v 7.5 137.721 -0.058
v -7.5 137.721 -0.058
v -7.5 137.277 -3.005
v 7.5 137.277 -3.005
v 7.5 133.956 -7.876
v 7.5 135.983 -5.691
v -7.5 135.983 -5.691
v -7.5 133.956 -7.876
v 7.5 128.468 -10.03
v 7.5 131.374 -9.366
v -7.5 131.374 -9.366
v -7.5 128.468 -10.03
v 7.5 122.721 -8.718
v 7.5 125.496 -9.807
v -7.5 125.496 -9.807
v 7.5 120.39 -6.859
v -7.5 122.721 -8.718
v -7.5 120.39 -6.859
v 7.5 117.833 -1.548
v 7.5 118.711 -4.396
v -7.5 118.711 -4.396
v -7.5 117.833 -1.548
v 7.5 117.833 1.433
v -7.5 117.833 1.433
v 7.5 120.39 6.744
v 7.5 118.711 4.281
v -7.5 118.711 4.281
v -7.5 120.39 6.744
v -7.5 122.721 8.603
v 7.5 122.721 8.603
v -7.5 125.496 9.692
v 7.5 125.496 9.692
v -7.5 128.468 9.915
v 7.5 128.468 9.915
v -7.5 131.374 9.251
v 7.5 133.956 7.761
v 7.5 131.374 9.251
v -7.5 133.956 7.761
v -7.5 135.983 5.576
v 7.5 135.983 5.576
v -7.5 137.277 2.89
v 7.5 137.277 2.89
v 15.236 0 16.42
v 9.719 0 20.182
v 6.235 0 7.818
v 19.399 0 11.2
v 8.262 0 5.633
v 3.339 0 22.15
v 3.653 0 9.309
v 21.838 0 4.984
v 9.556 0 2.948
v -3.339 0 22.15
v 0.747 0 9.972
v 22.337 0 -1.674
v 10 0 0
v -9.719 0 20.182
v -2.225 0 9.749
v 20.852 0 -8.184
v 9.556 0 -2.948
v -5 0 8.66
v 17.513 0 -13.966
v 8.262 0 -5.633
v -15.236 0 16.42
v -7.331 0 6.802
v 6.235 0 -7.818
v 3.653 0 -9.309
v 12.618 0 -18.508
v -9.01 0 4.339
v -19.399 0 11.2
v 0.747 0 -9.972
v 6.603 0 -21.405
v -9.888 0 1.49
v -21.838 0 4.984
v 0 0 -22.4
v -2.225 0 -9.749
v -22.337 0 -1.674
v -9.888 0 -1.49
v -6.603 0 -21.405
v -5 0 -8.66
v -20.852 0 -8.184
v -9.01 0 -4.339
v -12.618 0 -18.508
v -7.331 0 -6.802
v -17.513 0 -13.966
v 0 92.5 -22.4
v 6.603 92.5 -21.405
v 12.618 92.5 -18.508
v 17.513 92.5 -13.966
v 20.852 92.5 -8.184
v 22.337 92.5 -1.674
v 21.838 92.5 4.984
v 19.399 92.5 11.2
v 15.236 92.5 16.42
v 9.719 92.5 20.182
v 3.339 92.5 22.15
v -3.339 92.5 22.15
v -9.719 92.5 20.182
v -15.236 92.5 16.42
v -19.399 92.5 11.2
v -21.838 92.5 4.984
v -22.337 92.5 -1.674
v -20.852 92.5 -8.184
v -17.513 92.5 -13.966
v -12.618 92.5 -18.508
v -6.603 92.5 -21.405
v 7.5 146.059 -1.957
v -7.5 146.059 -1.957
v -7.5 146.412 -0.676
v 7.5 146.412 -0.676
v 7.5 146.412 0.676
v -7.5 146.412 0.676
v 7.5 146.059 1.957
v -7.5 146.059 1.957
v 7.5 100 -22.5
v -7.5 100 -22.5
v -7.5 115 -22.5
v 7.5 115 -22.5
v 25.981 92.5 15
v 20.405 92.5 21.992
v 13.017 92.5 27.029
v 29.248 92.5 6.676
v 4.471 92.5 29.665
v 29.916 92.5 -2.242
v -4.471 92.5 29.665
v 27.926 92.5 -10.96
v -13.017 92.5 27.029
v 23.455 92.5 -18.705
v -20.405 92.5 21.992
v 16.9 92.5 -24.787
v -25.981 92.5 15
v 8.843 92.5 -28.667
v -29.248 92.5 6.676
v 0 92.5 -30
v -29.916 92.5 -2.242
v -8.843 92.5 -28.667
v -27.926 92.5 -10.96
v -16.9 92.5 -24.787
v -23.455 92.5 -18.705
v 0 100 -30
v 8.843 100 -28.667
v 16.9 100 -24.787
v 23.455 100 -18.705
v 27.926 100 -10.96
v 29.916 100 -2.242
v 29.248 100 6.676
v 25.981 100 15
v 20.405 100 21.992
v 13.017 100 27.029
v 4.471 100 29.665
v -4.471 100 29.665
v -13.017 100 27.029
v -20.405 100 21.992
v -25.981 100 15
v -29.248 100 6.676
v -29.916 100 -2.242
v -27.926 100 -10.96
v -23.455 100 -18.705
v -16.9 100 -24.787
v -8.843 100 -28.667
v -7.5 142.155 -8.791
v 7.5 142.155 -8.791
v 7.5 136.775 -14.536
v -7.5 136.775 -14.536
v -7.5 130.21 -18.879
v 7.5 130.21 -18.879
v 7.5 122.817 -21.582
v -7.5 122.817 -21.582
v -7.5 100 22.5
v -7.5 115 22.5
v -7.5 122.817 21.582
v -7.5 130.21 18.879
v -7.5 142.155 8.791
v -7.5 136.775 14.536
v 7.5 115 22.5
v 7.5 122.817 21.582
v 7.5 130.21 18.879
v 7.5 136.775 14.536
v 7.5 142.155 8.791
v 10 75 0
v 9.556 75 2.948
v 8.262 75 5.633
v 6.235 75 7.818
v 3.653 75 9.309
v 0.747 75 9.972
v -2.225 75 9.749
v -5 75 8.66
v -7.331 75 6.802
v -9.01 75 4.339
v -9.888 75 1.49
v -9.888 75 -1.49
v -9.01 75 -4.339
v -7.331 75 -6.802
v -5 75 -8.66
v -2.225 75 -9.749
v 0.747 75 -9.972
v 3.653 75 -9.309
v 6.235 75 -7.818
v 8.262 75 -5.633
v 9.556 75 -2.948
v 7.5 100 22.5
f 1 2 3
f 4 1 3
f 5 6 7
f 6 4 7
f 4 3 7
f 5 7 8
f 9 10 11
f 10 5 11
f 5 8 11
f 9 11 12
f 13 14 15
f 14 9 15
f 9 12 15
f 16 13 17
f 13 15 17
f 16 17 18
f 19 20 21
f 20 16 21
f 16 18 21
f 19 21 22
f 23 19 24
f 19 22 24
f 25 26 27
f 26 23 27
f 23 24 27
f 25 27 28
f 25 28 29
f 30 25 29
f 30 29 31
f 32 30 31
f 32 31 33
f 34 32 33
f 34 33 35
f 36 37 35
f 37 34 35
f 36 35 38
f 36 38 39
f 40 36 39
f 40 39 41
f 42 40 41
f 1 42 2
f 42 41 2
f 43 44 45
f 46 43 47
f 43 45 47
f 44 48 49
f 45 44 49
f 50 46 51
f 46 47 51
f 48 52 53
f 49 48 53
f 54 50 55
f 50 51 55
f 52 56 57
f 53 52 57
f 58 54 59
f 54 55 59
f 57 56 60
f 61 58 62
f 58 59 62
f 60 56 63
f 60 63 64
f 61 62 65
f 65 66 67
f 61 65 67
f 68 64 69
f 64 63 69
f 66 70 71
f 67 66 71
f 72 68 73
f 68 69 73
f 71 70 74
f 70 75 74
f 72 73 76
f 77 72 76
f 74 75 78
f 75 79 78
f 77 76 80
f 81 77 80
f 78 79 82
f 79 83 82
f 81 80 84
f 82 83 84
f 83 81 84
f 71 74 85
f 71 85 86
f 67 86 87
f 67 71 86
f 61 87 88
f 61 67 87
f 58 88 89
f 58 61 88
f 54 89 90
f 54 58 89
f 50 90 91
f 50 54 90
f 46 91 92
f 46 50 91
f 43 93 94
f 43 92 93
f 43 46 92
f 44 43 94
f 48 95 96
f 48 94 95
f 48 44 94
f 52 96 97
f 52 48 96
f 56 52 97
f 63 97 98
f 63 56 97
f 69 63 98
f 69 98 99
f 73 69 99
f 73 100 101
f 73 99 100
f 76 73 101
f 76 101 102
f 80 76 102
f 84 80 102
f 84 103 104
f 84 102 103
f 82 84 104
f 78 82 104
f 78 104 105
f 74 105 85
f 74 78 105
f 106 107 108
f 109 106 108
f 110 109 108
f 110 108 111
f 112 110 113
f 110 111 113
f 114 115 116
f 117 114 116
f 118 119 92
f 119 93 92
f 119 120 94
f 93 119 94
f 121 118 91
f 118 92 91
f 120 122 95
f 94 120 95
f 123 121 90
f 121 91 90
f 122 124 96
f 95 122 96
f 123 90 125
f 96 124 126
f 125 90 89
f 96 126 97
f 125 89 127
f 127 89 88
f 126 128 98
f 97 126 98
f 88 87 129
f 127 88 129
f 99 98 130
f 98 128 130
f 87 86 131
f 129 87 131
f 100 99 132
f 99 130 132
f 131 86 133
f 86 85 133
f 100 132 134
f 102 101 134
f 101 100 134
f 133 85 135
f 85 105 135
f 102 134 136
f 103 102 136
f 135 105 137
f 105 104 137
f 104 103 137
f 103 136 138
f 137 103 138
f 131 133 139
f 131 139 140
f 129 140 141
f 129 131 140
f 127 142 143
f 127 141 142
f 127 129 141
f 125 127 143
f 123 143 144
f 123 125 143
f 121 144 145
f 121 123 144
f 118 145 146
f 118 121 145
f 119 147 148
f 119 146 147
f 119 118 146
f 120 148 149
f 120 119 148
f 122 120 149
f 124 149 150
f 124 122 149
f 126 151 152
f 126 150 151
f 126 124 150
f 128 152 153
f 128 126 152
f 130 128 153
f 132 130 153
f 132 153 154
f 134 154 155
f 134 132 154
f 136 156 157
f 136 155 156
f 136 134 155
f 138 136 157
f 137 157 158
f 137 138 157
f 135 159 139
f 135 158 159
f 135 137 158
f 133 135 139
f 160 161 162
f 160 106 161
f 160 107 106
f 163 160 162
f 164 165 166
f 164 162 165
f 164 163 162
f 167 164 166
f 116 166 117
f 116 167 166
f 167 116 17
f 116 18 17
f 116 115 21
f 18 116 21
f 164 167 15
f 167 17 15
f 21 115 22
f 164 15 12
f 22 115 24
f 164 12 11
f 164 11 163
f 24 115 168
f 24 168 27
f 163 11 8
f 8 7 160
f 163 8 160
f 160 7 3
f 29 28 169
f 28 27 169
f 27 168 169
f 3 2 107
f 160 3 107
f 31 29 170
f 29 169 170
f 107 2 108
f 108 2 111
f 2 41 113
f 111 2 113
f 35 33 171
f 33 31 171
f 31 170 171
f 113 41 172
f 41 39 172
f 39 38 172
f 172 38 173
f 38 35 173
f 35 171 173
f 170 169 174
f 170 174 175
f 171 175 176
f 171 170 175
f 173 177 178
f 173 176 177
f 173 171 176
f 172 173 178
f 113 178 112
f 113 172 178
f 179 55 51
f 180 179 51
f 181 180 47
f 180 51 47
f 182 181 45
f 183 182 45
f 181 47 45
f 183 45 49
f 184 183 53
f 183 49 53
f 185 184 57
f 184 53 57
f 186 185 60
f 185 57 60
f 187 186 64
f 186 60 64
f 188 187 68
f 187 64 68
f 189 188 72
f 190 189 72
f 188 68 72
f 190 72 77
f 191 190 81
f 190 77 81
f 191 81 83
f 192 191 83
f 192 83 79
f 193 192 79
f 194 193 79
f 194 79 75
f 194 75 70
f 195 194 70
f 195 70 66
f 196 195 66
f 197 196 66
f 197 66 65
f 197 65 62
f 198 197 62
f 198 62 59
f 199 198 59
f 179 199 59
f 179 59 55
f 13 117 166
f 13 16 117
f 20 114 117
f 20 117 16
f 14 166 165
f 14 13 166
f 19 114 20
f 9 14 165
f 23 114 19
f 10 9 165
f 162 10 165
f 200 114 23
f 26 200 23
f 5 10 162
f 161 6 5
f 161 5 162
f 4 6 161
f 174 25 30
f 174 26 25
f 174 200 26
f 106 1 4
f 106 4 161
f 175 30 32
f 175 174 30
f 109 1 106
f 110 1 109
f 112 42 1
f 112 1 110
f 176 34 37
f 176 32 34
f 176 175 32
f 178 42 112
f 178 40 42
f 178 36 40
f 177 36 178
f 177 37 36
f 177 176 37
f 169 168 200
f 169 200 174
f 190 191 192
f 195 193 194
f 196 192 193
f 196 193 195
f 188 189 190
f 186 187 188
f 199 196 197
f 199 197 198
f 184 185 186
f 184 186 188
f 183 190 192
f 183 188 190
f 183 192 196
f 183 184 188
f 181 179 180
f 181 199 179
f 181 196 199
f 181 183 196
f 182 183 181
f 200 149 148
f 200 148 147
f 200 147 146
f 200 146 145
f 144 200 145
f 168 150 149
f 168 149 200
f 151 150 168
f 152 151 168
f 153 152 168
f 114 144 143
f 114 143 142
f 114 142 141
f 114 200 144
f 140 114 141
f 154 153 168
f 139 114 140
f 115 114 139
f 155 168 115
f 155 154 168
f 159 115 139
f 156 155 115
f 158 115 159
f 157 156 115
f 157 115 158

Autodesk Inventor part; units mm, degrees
ref_plane "YZ Plane" through (0, 0, 0) normal (1, 0, 0) x (0, 1, 0)
ref_plane "XZ Plane" through (0, 0, 0) normal (0, 1, 0) x (-1, 0, 0)
ref_plane "XY Plane" through (0, 0, 0) normal (0, 0, 1) x (1, 0, 0)
sketch "Sketch1" plane through (0, 0, 0) normal (1, 0, 0) x (0, 1, 0)
  line L0 (0, 0) -> (100, 0)
  line L1 (100, 0) -> (100, -30)
  line L2 (100, -30) -> (92.5, -30)
  line L3 (92.5, -30) -> (92.5, -22.4)
  line L4 (92.5, -22.4) -> (0, -22.4)
  line L5 (0, -22.4) -> (0, 0)
  line L6 (100, 0) -> (100, -22.5)
  line L7 (100, -22.5) -> (115, -22.5)
  line L8 (100, 0) -> (100, 22.5)
  line L9 (100, 22.5) -> (115, 22.5)
  circle A0 centre (127.721, -0.0575) radius 10
  arc A1 (146.8198, 0) -> (115, 22.5) centre (115, -11.25) ccw
  arc A2 (115, -22.5) -> (146.8198, 0) centre (115, 11.25) ccw
  dimension "d0" = 100
  dimension "d1" = 30
  dimension "d2" = 7.5
  dimension "d3" = 7.6
  dimension "d9" = 22.5
  dimension "d10" = 15
  dimension "d11" = 22.5
  dimension "d15" = 20
  dimension "d26" = 33.75
  dimension "d27" = 33.75
revolve "Revolution1" add sketch "Sketch1" angle 360 about axis through (0, 0, 0) along (0, 1, 0) contours L0 L1 L2 L3 L4 L5
extrude "Extrusion1" add sketch "Sketch1" along normal mid plane 15 contours L8 L9 A1 A2 L7 L1
fillet "Fillet1" radius 5 1 edges at (0, 146.8198, 0)
thread "Thread1" size "M45x4.5" class "6g" standard "ANSI Metric M Profile" length 10
sketch "Sketch2" plane through (0, 0, 0) normal (0, -1, 0) x (1, 0, 0)
  circle A0 centre (0, 0) radius 10
  dimension "d23" = 20
extrude "Extrusion2" cut sketch "Sketch2" against normal blind 75
properties material "Aluminum 6061"
